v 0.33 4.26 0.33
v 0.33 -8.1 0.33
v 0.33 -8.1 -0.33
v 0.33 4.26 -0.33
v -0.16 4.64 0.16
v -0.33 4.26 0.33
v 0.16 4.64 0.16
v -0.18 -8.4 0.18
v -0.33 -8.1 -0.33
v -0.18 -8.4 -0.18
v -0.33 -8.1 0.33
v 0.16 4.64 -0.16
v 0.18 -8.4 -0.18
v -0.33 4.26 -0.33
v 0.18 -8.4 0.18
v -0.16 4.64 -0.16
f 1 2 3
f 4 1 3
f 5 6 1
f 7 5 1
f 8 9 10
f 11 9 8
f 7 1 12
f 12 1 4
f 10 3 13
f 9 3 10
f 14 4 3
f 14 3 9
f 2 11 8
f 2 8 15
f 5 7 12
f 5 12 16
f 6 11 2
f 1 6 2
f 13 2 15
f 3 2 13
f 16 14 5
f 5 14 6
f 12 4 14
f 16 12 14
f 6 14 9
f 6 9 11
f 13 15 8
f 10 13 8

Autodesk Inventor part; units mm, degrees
ref_plane "YZ Plane" through (0, 0, 0) normal (1, 0, 0) x (0, 1, 0)
ref_plane "XZ Plane" through (0, 0, 0) normal (0, 1, 0) x (-1, 0, 0)
ref_plane "XY Plane" through (0, 0, 0) normal (0, 0, 1) x (1, 0, 0)
sketch "Sketch1" plane through (0, 0, 0) normal (0, 1, 0) x (-1, 0, 0)
  line L0 (0.33, 0.33) -> (-0.33, 0.33)
  line L1 (-0.33, 0.33) -> (-0.33, -0.33)
  line L2 (-0.33, -0.33) -> (0.33, -0.33)
  line L3 (0.33, -0.33) -> (0.33, 0.33)
  line L4 (0.33, 0.33) -> (-0.33, -0.33) construction
  line L5 (-0.33, 0.33) -> (0.33, -0.33) construction
  point P0 (0, 0)
  dimension "d0" = 0.66
  dimension "d1" = 0.66
extrude "Extrusion1" add sketch "Sketch1" along normal blind 4.64 and the other way blind 8.4
chamfer "Chamfer13" distance 0.17 distance2 0.38 1 edges at (0.33, 4.64, 0) measured on face at (0.11, 4.64, 0.11)
chamfer "Chamfer14" distance 0.17 distance2 0.38 1 edges at (-0.33, 4.64, 0) measured on face at (-0.0033, 4.64, 0.11)
chamfer "Chamfer15" distance 0.17 distance2 0.38 1 edges at (0, 4.64, 0.33) measured on face at (0.0533, 4.64, 0.11)
chamfer "Chamfer16" distance 0.17 distance2 0.38 1 edges at (0, 4.64, -0.33) measured on face at (0.0533, 4.64, -0.0033)
chamfer "Chamfer17" distance 0.15 distance2 0.3 1 edges at (0.33, -8.4, 0) measured on face at (0.11, -8.4, 0.11)
chamfer "Chamfer18" distance 0.15 distance2 0.3 1 edges at (-0.33, -8.4, 0) measured on face at (0.01, -8.4, 0.11)
chamfer "Chamfer19" distance 0.15 distance2 0.3 1 edges at (0, -8.4, 0.33) measured on face at (0.06, -8.4, 0.11)
chamfer "Chamfer20" distance 0.15 distance2 0.3 1 edges at (0, -8.4, -0.33) measured on face at (0.06, -8.4, 0.01)
properties part number "Molex_0901_pin"
